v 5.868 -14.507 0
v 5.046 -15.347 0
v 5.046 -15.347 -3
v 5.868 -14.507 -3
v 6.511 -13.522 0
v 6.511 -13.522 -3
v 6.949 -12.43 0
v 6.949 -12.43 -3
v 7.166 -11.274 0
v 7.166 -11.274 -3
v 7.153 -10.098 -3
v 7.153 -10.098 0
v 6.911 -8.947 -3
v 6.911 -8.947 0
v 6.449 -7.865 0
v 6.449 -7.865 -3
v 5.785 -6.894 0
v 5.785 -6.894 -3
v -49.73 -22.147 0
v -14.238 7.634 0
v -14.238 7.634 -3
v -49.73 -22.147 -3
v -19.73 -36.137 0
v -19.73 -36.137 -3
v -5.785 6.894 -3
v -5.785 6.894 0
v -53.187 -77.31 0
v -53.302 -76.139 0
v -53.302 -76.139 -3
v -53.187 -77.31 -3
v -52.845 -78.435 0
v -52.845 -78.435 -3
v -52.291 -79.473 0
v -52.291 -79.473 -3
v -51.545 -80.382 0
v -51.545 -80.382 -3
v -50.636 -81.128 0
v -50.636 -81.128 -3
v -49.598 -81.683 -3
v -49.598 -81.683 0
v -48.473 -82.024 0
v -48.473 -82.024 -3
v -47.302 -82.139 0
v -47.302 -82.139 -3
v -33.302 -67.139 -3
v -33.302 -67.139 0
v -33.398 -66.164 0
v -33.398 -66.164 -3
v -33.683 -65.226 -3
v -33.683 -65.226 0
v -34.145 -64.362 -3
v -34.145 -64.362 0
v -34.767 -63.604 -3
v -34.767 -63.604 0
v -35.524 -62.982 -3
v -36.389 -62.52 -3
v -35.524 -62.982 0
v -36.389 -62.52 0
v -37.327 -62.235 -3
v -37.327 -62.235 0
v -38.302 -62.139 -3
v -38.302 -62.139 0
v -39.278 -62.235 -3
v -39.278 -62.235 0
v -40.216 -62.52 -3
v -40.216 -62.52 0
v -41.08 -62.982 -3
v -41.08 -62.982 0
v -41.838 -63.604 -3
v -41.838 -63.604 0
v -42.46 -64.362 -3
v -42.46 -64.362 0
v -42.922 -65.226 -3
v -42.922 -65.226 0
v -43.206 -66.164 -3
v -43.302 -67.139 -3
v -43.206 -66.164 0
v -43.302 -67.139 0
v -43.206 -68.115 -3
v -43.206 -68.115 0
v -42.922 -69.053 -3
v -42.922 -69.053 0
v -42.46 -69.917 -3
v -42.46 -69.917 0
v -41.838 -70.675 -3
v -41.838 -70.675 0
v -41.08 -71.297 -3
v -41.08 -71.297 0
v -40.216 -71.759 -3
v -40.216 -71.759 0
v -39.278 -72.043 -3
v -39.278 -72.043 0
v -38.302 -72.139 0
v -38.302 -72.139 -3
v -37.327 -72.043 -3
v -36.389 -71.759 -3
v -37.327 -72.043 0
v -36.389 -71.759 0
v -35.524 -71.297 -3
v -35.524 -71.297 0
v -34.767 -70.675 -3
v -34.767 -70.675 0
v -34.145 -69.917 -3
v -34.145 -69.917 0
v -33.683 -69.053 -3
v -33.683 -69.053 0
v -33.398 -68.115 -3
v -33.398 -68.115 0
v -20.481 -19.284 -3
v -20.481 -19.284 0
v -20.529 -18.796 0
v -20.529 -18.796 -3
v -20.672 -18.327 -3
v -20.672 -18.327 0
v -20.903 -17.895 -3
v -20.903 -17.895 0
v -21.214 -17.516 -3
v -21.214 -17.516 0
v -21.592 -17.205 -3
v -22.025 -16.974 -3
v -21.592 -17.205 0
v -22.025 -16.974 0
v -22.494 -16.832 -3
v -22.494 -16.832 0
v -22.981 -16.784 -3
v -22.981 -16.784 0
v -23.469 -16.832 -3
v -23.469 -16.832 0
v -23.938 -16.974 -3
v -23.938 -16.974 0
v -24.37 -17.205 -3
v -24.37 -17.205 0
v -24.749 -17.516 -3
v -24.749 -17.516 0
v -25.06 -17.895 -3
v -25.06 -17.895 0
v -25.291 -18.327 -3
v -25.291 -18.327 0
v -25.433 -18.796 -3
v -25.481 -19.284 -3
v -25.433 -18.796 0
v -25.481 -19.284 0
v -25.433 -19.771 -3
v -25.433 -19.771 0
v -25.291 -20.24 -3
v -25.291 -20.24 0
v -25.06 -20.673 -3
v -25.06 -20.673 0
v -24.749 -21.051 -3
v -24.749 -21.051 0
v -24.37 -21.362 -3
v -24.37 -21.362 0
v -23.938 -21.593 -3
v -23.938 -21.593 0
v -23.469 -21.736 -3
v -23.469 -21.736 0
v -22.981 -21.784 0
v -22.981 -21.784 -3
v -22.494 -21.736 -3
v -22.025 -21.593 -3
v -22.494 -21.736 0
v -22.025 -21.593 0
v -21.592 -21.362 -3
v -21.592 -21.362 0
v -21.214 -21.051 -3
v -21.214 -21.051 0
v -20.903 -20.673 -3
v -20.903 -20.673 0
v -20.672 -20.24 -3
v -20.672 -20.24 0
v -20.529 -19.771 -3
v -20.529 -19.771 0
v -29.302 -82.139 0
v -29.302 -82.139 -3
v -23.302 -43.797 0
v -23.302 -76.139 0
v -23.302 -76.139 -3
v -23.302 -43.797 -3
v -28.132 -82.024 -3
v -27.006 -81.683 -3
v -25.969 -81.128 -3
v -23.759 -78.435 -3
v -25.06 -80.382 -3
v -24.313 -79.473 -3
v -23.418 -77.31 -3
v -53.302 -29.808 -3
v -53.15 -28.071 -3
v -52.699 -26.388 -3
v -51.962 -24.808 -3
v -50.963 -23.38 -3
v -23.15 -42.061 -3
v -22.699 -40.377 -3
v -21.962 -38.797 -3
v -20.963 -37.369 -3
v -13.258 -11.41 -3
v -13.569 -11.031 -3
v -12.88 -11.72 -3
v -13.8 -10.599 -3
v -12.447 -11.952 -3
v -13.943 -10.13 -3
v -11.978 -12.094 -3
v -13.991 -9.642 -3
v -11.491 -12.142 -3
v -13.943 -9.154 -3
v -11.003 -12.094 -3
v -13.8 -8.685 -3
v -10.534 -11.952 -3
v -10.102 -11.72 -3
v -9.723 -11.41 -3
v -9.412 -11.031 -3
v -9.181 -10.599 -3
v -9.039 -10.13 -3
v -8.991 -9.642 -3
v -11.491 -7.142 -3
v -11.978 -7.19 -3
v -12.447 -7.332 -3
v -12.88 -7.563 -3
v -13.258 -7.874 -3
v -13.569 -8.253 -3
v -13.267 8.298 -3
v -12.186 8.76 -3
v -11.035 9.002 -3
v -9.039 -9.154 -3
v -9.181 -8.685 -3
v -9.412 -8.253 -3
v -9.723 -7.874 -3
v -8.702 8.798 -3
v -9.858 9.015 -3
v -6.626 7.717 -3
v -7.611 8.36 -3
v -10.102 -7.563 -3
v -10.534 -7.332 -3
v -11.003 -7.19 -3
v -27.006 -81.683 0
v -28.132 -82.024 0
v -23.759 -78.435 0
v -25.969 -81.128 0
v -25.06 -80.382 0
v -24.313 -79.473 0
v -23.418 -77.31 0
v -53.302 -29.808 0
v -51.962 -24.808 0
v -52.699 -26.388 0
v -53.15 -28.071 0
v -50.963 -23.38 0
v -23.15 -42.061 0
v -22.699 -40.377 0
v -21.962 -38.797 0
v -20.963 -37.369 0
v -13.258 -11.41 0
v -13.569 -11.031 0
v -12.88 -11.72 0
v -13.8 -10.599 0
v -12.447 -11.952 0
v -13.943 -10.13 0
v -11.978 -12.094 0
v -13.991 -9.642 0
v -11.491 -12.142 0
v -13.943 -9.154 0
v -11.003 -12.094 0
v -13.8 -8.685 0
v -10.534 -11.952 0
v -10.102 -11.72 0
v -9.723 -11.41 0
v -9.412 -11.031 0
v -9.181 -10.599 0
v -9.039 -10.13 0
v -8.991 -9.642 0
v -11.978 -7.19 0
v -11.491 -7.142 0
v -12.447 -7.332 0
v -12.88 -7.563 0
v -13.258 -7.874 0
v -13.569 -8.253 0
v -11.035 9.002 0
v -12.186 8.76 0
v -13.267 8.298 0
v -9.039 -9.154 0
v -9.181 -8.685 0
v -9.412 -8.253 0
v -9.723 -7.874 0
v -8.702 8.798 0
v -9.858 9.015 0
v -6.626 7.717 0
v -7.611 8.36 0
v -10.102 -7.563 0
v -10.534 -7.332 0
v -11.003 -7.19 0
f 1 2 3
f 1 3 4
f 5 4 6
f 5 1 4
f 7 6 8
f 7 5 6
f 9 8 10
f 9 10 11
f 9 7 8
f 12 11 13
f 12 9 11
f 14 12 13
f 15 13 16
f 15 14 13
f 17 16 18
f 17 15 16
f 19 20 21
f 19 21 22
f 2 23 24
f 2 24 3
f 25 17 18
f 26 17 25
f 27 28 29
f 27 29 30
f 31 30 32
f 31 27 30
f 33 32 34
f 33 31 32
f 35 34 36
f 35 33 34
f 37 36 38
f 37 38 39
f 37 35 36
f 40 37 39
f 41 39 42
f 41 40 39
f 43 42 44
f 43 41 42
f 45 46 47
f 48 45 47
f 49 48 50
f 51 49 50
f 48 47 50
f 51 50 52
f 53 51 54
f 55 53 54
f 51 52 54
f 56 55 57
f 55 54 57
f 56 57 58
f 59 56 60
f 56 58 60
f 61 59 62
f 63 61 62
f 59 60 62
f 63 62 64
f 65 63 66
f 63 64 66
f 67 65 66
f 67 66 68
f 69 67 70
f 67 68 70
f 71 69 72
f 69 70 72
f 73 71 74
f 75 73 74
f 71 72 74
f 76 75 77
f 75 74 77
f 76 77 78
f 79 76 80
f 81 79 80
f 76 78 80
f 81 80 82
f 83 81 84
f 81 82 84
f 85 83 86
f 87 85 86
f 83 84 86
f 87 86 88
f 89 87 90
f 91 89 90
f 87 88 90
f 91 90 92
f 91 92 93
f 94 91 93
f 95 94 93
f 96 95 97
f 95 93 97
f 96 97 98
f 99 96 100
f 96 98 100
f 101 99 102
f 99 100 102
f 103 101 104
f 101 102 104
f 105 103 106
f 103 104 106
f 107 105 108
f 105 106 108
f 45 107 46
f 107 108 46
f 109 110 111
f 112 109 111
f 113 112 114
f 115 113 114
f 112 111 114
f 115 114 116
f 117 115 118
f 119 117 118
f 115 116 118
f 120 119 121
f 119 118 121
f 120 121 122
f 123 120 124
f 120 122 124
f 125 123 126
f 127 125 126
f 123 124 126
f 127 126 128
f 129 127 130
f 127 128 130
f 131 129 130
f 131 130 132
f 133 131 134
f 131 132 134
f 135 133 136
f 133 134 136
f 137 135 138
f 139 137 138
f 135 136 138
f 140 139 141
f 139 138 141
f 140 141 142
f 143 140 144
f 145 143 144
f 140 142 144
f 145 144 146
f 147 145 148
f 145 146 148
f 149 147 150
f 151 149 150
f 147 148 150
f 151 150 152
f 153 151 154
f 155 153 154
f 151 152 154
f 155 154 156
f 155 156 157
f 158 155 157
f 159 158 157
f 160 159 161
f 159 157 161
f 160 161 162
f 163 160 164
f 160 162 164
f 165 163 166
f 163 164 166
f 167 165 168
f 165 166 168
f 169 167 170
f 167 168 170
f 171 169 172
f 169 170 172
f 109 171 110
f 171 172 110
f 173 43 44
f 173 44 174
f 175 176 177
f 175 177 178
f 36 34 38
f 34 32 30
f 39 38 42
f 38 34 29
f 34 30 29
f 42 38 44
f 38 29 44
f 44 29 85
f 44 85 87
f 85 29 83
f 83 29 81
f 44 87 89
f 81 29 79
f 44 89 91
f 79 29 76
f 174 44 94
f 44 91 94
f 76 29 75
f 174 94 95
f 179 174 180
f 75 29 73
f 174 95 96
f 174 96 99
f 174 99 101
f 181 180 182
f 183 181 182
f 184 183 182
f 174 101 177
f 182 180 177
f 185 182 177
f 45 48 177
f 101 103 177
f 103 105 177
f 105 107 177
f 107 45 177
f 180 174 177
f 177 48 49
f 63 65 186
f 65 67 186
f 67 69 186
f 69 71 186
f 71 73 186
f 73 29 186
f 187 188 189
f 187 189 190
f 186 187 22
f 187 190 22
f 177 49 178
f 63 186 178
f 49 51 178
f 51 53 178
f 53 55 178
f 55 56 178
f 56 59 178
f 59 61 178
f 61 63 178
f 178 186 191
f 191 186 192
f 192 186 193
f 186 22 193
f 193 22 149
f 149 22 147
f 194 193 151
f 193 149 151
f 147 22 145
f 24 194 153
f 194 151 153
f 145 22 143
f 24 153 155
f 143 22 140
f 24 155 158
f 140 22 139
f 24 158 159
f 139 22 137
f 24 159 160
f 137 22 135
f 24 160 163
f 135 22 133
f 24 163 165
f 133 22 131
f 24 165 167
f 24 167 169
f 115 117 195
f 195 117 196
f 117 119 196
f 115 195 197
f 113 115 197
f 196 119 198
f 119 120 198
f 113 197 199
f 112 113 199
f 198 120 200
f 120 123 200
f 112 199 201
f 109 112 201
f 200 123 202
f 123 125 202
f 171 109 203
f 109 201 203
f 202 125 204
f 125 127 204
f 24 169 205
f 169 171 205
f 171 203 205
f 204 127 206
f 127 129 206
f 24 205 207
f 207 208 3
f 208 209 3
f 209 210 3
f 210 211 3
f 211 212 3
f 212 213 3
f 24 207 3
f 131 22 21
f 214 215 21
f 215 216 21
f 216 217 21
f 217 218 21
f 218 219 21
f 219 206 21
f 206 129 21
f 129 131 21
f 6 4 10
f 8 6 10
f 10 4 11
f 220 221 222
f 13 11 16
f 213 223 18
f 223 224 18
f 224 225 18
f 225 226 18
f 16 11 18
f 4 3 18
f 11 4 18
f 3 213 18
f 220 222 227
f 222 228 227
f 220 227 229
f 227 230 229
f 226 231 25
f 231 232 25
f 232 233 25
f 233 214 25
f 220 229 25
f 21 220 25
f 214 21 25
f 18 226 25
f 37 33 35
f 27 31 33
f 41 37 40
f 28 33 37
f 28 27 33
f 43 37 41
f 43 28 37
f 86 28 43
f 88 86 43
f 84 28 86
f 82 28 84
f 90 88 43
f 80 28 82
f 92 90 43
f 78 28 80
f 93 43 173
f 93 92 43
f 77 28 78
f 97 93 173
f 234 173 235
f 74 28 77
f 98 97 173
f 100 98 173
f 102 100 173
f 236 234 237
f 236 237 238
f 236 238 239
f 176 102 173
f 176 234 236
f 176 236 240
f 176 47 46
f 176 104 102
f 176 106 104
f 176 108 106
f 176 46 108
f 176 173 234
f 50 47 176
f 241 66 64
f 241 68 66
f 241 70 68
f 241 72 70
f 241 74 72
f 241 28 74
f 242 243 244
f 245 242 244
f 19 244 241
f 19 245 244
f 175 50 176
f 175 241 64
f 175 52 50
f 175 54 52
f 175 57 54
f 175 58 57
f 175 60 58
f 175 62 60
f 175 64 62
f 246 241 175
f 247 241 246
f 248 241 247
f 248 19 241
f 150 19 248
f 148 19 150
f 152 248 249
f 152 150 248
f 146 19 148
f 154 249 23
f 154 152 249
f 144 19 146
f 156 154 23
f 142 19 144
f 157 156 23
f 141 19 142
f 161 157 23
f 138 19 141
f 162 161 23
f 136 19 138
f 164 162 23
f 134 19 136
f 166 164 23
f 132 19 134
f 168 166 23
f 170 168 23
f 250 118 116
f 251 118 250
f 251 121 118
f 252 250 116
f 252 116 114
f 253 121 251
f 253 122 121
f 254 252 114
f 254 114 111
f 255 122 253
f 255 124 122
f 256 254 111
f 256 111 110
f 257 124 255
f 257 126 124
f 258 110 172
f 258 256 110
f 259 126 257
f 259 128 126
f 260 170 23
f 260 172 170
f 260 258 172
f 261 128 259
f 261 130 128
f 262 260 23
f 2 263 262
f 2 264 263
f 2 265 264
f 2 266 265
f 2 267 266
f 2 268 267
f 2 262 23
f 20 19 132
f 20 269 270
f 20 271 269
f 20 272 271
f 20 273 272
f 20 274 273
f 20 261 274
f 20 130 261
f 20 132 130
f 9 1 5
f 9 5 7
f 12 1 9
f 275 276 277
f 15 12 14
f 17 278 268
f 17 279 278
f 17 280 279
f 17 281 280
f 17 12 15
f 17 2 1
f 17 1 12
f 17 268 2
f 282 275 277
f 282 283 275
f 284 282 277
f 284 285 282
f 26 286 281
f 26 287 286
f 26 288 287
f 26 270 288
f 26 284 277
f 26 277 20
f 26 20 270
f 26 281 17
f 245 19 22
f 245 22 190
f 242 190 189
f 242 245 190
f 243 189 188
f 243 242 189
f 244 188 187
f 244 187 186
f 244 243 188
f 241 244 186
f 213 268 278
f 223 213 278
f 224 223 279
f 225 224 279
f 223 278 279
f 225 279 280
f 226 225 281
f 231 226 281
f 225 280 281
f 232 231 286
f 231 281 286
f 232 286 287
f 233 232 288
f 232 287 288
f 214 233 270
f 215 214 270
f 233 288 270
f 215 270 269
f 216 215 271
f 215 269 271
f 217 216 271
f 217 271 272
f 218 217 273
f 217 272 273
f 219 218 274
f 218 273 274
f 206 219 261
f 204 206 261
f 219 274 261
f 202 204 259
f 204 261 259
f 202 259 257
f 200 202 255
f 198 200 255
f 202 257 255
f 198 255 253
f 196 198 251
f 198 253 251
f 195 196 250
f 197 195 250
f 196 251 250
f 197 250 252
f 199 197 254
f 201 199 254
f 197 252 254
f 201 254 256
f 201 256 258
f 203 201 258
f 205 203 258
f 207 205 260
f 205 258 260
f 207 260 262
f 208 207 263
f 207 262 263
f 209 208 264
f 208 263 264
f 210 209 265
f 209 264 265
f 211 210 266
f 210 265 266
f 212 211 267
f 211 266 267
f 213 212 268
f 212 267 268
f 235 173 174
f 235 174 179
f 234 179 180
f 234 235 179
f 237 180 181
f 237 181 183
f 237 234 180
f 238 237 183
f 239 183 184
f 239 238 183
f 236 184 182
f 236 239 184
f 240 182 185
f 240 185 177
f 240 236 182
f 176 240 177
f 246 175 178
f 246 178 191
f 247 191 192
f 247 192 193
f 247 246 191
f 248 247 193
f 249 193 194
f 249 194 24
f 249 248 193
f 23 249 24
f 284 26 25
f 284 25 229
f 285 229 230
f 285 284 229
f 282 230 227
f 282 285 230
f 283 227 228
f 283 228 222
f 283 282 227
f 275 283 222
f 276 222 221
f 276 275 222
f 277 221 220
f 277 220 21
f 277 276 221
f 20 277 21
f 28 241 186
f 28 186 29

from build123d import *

# Parameters (mm, degrees)
SKETCH1_R          = 5
SKETCH1_R_2        = 2.5
BASE_FLANGE1_DEPTH = 3


# Sheet-metal steps are written as plain solids
with BuildPart() as part:
    # Sketch1 → Base-Flange1 (new body)
    with BuildSketch(Plane.XY):
        with BuildLine():
            Line((-14.238080804, 7.633940989), (-49.730098253, -22.147397762))
            ThreePointArc((-49.730098253, -22.147397762), (-52.365300026, -25.581659576), (-53.302222156, -29.807842194))
            Line((-53.302222156, -29.807842194), (-53.302222156, -48.56164166))
            Line((-53.302222156, -48.56164166), (-53.302222156, -76.139380484))
            ThreePointArc((-53.302222156, -76.139380484), (-51.544862843, -80.382021171), (-47.302222156, -82.139380484))
            Line((-47.302222156, -82.139380484), (-29.302222156, -82.139380484))
            ThreePointArc((-29.302222156, -82.139380484), (-25.059581469, -80.382021171), (-23.302222156, -76.139380484))
            Line((-23.302222156, -76.139380484), (-23.302222156, -48.56164166))
            Line((-23.302222156, -48.56164166), (-23.302222156, -43.797071938))
            ThreePointArc((-23.302222156, -43.797071938), (-22.365300026, -39.570889321), (-19.730098253, -36.136627507))
            Line((-19.730098253, -36.136627507), (5.045547487, -15.347392305))
            ThreePointArc((5.045547487, -15.347392305), (7.165990017, -11.274060103), (5.785088487, -6.894399988))
            Line((5.785088487, -6.894399988), (-5.785088487, 6.894399988))
            ThreePointArc((-5.785088487, 6.894399988), (-9.858420689, 9.014842519), (-14.238080804, 7.633940989))
        make_face()
        with Locations((-38.302222156, -67.139380484)):
            Circle(SKETCH1_R, mode=Mode.SUBTRACT)
        with Locations((-11.490666647, -9.641814145)):
            Circle(SKETCH1_R_2, mode=Mode.SUBTRACT)
        with Locations((-22.981333294, -19.283628291)):
            Circle(SKETCH1_R_2, mode=Mode.SUBTRACT)
    extrude(amount=-BASE_FLANGE1_DEPTH)


solid = part.part
